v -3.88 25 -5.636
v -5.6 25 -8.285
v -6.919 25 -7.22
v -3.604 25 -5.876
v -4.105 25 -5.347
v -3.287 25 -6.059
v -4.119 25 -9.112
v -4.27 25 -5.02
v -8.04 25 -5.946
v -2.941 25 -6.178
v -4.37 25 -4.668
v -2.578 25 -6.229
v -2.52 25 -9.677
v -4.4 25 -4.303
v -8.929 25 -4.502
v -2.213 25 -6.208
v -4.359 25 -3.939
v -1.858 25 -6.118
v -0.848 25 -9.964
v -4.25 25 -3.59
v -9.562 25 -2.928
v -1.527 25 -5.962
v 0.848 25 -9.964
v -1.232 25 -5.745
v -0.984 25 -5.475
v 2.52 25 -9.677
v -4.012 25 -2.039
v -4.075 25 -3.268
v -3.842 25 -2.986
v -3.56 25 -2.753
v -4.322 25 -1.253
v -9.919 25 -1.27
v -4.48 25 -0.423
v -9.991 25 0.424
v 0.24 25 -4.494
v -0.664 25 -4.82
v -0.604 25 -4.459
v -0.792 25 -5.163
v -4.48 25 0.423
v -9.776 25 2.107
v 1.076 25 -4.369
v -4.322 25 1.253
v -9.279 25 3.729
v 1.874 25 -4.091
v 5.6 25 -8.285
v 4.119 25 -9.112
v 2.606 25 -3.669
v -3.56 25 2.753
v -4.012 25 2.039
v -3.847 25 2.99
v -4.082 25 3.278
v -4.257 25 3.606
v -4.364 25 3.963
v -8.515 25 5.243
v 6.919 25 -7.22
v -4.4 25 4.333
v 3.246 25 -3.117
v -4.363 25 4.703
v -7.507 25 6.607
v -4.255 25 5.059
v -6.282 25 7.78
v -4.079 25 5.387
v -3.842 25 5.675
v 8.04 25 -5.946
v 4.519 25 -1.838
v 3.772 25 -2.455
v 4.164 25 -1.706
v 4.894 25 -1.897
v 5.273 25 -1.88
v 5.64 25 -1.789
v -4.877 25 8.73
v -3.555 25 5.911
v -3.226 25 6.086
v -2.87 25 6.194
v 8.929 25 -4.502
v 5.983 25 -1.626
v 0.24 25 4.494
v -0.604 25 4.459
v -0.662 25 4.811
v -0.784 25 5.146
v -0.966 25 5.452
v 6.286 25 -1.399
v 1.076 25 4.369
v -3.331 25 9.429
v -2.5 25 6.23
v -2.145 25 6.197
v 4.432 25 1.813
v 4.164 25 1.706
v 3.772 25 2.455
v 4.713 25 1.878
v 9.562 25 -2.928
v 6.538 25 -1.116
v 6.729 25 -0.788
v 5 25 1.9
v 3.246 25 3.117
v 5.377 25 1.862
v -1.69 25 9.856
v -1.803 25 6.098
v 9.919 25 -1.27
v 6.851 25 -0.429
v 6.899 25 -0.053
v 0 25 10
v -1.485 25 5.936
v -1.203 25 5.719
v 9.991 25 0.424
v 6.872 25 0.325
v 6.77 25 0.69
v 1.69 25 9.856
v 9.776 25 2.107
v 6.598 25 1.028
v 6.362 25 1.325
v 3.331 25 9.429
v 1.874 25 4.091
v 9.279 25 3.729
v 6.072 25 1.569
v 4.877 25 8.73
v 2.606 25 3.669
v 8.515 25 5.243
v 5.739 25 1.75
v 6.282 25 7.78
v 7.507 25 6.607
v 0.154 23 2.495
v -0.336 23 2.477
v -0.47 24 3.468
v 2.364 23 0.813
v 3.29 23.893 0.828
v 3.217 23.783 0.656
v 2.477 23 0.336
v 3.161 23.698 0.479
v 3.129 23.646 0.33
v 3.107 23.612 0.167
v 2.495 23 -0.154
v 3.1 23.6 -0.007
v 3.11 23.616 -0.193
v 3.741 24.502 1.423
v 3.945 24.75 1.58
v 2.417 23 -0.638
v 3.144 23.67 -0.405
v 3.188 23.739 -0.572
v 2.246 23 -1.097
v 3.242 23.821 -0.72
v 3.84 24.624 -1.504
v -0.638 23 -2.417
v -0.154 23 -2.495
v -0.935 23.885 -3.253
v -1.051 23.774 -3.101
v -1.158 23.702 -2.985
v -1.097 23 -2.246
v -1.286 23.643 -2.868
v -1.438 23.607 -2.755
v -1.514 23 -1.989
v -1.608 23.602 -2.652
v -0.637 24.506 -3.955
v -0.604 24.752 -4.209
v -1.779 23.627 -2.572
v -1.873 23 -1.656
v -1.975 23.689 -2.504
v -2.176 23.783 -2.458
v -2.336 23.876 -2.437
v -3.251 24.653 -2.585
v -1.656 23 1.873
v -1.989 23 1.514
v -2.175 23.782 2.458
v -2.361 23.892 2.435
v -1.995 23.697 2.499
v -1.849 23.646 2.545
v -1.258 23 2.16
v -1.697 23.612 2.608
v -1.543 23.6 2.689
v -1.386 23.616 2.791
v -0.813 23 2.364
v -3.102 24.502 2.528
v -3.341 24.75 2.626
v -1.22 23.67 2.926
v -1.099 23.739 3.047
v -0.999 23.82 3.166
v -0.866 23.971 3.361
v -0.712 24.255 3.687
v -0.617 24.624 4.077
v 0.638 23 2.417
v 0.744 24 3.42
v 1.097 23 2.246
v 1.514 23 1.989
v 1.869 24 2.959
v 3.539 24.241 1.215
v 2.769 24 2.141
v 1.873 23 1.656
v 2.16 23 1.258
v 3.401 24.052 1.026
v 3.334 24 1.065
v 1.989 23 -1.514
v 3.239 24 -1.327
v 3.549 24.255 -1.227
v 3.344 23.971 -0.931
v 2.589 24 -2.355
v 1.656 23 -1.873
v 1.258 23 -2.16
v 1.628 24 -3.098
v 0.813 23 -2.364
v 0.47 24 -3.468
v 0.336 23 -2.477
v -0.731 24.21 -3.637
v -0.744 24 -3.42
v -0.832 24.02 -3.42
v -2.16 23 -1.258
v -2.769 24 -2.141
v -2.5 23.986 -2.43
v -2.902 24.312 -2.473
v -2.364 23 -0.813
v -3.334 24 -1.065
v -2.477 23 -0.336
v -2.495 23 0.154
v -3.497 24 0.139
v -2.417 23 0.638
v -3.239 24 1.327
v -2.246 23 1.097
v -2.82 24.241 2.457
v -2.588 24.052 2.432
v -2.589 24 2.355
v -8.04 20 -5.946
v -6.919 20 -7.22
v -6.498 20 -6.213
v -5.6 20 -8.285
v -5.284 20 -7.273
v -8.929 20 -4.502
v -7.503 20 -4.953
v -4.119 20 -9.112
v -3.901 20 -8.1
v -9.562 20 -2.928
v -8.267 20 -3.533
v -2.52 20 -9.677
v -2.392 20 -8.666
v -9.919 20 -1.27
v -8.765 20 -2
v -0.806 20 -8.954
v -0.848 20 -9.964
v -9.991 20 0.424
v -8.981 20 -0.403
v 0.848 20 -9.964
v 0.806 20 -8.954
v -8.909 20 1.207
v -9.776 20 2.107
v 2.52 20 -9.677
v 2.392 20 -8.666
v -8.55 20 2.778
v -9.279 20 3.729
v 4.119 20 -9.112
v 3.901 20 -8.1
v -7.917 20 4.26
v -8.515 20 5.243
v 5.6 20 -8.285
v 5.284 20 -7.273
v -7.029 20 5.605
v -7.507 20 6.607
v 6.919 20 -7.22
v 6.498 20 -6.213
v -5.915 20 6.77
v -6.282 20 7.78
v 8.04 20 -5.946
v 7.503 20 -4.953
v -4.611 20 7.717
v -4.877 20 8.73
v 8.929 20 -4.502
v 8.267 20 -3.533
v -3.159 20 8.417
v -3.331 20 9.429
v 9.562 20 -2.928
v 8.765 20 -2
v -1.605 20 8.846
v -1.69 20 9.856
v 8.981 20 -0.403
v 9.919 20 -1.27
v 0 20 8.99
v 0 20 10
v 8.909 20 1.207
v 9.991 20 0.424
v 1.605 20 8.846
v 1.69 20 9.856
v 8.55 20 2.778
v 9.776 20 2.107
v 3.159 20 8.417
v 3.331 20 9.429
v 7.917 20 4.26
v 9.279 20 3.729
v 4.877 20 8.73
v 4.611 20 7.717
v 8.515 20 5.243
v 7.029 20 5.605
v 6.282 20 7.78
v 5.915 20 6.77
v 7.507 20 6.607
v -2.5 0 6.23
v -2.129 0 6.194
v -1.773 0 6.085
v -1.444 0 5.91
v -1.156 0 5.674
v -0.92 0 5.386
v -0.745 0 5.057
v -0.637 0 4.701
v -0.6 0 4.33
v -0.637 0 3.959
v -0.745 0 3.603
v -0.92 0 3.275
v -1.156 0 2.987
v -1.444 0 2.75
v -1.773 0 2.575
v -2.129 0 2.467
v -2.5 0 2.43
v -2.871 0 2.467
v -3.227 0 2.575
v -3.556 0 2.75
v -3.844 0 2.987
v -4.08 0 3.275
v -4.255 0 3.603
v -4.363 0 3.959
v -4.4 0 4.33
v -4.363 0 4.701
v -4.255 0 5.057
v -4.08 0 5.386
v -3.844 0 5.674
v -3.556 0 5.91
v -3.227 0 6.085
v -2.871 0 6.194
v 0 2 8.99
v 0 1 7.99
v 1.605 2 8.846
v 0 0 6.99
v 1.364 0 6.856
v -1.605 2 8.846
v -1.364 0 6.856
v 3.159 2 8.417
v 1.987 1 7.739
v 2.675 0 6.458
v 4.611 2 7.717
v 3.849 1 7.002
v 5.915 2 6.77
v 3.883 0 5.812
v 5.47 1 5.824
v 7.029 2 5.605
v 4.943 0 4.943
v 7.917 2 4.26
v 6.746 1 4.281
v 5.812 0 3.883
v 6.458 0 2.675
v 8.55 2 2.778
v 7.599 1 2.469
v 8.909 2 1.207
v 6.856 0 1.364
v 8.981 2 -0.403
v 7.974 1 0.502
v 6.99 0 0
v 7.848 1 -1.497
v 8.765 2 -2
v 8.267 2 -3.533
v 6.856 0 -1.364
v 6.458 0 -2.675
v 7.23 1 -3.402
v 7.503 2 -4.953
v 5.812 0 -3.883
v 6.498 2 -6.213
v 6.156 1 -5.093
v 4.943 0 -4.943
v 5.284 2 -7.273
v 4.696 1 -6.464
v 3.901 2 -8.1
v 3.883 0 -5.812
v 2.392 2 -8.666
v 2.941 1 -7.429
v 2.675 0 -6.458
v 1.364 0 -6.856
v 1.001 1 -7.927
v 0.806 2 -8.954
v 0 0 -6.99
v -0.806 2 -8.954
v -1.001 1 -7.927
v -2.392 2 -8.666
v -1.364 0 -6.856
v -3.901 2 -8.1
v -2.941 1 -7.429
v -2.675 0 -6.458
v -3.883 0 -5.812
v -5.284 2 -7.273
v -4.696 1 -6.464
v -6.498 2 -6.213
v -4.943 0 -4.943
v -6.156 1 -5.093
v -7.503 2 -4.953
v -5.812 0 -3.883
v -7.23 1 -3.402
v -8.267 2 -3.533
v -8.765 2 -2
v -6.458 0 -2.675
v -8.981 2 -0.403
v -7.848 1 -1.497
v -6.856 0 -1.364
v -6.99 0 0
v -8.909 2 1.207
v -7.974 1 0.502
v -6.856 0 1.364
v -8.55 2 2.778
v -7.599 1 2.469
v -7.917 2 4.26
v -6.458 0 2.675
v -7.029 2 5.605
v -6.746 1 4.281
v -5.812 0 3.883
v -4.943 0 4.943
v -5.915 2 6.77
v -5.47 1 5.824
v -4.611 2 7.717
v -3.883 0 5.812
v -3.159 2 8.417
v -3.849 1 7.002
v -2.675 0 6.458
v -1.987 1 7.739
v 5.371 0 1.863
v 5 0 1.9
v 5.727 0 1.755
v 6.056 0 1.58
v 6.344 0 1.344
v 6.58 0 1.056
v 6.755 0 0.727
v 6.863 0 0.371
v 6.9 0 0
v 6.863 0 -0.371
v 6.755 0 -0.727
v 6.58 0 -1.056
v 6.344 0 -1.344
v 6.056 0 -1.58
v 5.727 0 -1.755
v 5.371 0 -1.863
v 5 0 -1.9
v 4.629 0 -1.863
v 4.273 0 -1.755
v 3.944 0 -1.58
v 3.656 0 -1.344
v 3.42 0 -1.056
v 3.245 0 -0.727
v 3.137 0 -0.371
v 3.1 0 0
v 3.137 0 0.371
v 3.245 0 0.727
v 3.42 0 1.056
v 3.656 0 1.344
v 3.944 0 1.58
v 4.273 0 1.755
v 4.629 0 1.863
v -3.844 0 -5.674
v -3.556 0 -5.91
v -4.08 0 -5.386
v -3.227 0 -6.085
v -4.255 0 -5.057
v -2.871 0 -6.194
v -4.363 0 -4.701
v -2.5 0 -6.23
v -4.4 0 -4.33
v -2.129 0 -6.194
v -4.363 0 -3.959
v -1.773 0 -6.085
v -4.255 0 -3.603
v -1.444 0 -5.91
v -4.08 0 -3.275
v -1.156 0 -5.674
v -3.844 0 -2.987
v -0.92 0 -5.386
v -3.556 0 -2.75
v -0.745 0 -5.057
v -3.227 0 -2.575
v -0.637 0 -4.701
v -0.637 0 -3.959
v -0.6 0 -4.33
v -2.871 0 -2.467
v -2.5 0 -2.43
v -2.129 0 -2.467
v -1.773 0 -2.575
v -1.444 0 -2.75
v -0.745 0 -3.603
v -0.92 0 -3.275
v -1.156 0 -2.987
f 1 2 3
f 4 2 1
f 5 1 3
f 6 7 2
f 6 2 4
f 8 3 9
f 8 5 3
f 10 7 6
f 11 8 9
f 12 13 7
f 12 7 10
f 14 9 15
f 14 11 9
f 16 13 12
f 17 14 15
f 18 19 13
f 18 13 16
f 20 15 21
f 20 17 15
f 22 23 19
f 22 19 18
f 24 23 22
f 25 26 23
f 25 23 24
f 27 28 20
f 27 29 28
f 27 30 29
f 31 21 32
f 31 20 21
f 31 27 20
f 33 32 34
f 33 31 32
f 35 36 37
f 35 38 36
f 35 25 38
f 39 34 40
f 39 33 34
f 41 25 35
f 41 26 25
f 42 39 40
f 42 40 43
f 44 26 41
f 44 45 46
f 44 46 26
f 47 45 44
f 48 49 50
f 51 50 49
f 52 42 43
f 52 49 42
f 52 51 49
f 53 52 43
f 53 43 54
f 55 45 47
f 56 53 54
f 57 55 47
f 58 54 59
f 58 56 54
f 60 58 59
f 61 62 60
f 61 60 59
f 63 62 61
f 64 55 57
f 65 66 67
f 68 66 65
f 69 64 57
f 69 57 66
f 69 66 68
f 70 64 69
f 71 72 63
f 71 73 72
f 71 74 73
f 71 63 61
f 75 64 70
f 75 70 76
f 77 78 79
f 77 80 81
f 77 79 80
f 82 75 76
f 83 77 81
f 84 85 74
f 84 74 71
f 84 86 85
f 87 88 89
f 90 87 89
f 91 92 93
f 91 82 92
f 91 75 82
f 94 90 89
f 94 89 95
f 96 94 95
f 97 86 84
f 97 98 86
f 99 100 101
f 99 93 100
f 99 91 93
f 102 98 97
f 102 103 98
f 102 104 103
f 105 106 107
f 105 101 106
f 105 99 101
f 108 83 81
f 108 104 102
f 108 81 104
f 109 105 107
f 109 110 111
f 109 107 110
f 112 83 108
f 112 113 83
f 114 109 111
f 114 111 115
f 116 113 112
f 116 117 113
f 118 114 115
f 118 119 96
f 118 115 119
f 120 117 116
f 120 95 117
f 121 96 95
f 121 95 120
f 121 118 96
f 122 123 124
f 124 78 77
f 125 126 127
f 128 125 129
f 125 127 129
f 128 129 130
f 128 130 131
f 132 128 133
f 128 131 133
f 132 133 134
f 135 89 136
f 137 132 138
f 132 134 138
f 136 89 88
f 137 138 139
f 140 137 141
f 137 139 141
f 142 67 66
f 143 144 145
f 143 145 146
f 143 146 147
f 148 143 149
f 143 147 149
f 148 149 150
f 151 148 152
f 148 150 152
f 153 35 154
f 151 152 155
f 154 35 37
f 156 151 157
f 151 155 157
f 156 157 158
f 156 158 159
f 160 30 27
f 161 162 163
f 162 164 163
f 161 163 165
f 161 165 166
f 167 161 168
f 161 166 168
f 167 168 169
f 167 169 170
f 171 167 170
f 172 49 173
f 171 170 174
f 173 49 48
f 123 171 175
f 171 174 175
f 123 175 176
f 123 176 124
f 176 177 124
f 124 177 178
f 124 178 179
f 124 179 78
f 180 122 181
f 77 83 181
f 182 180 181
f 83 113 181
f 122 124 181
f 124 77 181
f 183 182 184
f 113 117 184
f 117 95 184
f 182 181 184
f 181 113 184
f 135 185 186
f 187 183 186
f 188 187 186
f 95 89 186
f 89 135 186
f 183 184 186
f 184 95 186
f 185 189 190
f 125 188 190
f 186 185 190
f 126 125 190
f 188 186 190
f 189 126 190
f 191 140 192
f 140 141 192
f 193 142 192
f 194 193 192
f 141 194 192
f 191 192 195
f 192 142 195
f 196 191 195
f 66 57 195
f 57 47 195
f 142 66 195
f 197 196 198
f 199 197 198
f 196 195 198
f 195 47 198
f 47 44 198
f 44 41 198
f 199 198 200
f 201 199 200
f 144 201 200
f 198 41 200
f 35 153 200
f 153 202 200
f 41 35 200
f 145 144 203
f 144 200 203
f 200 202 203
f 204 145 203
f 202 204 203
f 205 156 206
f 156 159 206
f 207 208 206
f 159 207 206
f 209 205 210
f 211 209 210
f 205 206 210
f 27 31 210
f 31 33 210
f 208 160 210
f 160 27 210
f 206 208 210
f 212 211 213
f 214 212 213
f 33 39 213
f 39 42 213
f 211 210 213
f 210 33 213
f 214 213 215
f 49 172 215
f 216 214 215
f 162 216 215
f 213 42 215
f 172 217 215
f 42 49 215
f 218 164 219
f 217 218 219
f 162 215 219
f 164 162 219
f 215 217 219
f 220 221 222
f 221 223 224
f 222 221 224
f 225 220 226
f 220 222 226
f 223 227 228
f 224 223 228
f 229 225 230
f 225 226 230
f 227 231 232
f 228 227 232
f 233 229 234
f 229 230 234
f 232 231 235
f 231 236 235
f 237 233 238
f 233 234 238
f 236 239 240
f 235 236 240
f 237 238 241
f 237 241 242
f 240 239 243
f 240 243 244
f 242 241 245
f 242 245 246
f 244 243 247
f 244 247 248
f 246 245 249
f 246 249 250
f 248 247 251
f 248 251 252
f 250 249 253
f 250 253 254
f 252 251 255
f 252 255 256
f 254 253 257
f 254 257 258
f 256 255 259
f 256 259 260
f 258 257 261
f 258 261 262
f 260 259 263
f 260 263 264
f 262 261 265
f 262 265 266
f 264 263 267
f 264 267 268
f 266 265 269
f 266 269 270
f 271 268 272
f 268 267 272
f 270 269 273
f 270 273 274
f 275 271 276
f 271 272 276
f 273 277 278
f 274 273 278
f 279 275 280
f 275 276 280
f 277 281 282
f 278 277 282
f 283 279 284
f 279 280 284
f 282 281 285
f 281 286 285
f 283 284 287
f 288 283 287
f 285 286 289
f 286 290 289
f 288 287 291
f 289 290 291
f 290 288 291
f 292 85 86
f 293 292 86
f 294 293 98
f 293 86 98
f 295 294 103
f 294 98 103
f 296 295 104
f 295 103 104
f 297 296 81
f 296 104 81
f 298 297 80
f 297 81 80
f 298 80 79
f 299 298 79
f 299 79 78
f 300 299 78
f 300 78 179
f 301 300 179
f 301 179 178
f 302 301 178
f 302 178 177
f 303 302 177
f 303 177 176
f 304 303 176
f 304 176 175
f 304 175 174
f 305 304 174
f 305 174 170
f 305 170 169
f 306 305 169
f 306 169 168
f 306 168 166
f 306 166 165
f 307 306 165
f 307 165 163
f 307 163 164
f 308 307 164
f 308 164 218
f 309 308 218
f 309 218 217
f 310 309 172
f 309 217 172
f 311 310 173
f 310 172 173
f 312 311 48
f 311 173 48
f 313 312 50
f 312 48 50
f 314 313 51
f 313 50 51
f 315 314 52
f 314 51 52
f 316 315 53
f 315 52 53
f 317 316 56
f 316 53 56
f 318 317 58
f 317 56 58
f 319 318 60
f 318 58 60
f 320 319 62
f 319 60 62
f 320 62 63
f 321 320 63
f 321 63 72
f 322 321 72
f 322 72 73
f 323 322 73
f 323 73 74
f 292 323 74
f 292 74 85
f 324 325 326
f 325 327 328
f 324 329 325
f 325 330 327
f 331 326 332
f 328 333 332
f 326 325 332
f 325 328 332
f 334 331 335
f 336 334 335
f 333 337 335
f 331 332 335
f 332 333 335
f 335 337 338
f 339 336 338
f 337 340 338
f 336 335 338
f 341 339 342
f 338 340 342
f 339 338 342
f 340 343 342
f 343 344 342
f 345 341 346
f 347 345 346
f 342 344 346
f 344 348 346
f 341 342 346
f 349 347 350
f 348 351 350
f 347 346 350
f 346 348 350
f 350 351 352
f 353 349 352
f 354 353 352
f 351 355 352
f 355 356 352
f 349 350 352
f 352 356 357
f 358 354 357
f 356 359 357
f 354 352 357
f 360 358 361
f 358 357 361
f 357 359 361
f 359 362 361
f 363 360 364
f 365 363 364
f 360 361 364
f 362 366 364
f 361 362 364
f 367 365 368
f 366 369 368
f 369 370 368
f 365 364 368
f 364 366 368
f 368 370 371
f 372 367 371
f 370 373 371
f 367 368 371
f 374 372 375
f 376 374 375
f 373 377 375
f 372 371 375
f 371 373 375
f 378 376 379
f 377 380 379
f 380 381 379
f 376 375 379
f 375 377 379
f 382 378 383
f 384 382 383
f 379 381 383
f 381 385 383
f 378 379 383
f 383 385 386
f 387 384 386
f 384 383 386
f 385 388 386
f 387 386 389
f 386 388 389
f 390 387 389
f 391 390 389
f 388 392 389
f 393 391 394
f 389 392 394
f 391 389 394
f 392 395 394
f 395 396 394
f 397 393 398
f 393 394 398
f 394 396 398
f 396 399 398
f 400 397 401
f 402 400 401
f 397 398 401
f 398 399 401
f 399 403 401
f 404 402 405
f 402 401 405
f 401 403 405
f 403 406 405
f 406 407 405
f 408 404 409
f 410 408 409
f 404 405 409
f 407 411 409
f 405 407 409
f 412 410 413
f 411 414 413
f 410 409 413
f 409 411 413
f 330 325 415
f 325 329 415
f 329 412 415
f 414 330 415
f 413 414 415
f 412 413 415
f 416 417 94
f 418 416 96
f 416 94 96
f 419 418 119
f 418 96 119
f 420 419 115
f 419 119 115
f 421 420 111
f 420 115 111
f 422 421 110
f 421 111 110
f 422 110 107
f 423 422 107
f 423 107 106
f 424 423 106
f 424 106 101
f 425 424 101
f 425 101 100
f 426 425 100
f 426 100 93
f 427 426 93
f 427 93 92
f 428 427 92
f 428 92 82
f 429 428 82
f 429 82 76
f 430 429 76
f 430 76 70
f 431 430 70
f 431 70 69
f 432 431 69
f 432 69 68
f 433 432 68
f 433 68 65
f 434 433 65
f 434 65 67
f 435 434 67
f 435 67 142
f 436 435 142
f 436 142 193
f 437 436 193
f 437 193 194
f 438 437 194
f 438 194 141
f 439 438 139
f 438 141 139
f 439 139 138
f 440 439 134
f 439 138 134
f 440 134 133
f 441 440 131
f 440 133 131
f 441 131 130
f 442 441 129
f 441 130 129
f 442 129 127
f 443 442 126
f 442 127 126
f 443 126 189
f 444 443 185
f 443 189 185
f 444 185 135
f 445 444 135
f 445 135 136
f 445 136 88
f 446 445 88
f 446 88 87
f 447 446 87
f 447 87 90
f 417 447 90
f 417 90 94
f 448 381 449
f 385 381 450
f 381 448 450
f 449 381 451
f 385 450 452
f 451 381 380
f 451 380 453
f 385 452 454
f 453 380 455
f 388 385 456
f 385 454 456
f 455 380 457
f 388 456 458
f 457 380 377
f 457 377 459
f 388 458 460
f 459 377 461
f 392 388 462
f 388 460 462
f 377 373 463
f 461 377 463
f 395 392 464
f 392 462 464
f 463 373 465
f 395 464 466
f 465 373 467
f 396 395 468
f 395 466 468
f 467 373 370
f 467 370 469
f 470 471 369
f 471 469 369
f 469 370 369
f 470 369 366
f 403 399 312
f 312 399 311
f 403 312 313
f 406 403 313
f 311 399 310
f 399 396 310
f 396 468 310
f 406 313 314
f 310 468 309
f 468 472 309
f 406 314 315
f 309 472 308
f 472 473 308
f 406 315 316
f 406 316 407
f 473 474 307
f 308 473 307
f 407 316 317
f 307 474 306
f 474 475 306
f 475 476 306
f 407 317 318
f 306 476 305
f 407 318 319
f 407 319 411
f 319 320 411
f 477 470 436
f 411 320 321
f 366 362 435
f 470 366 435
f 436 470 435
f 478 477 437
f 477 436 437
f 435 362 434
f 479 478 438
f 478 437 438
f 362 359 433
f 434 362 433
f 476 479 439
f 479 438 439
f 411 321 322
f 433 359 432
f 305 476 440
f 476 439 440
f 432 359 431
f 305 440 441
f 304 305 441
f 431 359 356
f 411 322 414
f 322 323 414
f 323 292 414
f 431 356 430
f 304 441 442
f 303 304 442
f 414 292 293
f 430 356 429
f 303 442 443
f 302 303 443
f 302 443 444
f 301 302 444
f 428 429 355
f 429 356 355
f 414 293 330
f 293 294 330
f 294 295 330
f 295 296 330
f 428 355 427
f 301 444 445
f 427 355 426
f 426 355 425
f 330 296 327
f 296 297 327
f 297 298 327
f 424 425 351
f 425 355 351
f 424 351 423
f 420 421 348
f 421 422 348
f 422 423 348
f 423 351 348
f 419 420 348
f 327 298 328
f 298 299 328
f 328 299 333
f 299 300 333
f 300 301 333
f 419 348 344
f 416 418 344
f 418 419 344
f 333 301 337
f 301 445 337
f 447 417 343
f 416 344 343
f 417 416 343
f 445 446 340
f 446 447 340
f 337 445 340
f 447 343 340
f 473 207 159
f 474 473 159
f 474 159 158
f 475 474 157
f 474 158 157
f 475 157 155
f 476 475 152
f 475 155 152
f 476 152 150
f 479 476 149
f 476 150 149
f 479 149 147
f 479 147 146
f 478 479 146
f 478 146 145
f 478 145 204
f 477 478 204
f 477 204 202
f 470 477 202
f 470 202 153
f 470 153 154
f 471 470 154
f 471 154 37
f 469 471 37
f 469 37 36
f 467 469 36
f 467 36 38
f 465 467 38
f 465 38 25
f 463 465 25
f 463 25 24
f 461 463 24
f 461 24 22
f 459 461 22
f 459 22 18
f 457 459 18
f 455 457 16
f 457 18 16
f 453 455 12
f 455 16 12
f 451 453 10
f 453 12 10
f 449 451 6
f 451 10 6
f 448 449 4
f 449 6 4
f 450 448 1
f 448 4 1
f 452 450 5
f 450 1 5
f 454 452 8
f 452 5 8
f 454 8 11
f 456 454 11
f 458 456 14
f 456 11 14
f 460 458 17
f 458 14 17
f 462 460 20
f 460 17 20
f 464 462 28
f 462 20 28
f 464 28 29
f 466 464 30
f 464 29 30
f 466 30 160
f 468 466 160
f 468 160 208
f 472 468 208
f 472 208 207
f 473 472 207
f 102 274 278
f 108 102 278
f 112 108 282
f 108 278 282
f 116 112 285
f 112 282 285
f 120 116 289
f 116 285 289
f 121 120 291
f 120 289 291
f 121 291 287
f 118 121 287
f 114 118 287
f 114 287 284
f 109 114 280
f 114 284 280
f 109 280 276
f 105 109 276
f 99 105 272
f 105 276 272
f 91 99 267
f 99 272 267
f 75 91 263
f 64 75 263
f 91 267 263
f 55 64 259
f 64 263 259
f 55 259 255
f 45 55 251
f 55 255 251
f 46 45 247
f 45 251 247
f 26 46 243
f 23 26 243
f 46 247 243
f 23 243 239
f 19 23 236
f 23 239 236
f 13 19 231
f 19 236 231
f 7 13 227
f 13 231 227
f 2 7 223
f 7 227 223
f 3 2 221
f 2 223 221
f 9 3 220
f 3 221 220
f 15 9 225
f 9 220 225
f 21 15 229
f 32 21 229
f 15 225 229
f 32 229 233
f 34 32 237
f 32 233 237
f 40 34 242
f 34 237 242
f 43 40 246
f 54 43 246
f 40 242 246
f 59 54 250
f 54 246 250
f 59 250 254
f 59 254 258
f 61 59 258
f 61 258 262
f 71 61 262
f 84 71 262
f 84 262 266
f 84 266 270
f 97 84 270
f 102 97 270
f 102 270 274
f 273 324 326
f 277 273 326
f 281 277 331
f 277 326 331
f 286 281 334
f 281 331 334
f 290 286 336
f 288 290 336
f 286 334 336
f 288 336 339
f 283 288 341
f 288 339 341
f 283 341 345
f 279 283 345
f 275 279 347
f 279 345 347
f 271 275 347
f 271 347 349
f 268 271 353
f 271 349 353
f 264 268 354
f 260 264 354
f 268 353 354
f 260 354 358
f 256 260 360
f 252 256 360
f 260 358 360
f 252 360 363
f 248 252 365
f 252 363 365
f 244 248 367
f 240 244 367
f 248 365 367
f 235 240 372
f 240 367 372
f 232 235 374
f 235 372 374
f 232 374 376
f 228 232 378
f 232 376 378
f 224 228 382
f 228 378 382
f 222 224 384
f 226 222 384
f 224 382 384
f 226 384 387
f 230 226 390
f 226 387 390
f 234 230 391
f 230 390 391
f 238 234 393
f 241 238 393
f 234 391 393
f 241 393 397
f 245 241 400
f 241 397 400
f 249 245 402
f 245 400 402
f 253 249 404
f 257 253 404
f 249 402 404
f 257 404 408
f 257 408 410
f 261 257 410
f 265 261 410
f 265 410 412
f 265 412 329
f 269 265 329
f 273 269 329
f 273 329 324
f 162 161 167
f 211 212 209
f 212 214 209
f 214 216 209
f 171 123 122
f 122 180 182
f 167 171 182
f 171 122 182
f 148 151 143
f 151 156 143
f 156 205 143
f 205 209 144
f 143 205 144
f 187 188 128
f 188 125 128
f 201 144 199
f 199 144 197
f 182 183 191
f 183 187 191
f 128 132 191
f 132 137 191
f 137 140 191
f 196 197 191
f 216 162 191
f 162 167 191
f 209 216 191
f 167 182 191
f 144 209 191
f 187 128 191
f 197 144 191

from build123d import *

# Parameters (mm, degrees)
SKETCH_1_R          = 8.99
EXTRUDE_1_DEPTH     = 20
SKETCH_2_R          = 10
EXTRUDE_2_DEPTH     = 5
CHAMFER_1_SIZE      = 2
SKETCH_3_R          = 1.9
CUT_EXTRUDE_1_DEPTH = 36


with BuildPart() as part:
    # 草图1 → 凸台-拉伸1 (new body)
    with BuildSketch(Plane(origin=(0, 0, 0), x_dir=(1, 0, 0), z_dir=(0, 1, 0))):
        with Locations(Location((0, 0, 0), (0, 0, 270))):
            Circle(SKETCH_1_R)
    extrude(amount=EXTRUDE_1_DEPTH)

    # 草图2 → 凸台-拉伸2 (add)
    with BuildSketch(Plane(origin=(0, 20, 0), x_dir=(1, 0, 0), z_dir=(0, 1, 0))):
        with Locations(Location((0, 0, 0), (0, 0, 270))):
            Circle(SKETCH_2_R)
    extrude(amount=EXTRUDE_2_DEPTH)

    # 倒角1
    chamfer_1_edges = [part.edges().sort_by_distance(p)[0] for p in [
        (0, 0, -8.99),
    ]]
    chamfer(chamfer_1_edges, length=CHAMFER_1_SIZE)

    # 草图3 → 切除-拉伸1 (cut)
    with BuildSketch(Plane(origin=(0, 25, 0), x_dir=(1, 0, 0), z_dir=(0, 1, 0))):
        with Locations(Location((5, 0, 0), (0, 0, 270))):
            Circle(SKETCH_3_R)
        with Locations(Location((-2.5, -4.330127019, 0), (0, 0, 270))):
            Circle(SKETCH_3_R)
        with Locations(Location((-2.5, 4.330127019, 0), (0, 0, 270))):
            Circle(SKETCH_3_R)
    extrude(amount=-CUT_EXTRUDE_1_DEPTH, mode=Mode.SUBTRACT)

    # 草图5 → 切除-旋转1 (revolve, cut)
    with BuildSketch(Plane.XY, mode=Mode.PRIVATE) as cut_revolve_1_sk:
        Polygon((0, 23), (-2.5, 23), (-5.780837962, 26.280837962), (0, 26.280837962), align=None)
    revolve(cut_revolve_1_sk.sketch.rotate(Axis((0, 0, 0), (0, 1, 0)), 82.281327408), axis=Axis((0, 0, 0), (0, 1, 0)), mode=Mode.SUBTRACT)


solid = part.part
